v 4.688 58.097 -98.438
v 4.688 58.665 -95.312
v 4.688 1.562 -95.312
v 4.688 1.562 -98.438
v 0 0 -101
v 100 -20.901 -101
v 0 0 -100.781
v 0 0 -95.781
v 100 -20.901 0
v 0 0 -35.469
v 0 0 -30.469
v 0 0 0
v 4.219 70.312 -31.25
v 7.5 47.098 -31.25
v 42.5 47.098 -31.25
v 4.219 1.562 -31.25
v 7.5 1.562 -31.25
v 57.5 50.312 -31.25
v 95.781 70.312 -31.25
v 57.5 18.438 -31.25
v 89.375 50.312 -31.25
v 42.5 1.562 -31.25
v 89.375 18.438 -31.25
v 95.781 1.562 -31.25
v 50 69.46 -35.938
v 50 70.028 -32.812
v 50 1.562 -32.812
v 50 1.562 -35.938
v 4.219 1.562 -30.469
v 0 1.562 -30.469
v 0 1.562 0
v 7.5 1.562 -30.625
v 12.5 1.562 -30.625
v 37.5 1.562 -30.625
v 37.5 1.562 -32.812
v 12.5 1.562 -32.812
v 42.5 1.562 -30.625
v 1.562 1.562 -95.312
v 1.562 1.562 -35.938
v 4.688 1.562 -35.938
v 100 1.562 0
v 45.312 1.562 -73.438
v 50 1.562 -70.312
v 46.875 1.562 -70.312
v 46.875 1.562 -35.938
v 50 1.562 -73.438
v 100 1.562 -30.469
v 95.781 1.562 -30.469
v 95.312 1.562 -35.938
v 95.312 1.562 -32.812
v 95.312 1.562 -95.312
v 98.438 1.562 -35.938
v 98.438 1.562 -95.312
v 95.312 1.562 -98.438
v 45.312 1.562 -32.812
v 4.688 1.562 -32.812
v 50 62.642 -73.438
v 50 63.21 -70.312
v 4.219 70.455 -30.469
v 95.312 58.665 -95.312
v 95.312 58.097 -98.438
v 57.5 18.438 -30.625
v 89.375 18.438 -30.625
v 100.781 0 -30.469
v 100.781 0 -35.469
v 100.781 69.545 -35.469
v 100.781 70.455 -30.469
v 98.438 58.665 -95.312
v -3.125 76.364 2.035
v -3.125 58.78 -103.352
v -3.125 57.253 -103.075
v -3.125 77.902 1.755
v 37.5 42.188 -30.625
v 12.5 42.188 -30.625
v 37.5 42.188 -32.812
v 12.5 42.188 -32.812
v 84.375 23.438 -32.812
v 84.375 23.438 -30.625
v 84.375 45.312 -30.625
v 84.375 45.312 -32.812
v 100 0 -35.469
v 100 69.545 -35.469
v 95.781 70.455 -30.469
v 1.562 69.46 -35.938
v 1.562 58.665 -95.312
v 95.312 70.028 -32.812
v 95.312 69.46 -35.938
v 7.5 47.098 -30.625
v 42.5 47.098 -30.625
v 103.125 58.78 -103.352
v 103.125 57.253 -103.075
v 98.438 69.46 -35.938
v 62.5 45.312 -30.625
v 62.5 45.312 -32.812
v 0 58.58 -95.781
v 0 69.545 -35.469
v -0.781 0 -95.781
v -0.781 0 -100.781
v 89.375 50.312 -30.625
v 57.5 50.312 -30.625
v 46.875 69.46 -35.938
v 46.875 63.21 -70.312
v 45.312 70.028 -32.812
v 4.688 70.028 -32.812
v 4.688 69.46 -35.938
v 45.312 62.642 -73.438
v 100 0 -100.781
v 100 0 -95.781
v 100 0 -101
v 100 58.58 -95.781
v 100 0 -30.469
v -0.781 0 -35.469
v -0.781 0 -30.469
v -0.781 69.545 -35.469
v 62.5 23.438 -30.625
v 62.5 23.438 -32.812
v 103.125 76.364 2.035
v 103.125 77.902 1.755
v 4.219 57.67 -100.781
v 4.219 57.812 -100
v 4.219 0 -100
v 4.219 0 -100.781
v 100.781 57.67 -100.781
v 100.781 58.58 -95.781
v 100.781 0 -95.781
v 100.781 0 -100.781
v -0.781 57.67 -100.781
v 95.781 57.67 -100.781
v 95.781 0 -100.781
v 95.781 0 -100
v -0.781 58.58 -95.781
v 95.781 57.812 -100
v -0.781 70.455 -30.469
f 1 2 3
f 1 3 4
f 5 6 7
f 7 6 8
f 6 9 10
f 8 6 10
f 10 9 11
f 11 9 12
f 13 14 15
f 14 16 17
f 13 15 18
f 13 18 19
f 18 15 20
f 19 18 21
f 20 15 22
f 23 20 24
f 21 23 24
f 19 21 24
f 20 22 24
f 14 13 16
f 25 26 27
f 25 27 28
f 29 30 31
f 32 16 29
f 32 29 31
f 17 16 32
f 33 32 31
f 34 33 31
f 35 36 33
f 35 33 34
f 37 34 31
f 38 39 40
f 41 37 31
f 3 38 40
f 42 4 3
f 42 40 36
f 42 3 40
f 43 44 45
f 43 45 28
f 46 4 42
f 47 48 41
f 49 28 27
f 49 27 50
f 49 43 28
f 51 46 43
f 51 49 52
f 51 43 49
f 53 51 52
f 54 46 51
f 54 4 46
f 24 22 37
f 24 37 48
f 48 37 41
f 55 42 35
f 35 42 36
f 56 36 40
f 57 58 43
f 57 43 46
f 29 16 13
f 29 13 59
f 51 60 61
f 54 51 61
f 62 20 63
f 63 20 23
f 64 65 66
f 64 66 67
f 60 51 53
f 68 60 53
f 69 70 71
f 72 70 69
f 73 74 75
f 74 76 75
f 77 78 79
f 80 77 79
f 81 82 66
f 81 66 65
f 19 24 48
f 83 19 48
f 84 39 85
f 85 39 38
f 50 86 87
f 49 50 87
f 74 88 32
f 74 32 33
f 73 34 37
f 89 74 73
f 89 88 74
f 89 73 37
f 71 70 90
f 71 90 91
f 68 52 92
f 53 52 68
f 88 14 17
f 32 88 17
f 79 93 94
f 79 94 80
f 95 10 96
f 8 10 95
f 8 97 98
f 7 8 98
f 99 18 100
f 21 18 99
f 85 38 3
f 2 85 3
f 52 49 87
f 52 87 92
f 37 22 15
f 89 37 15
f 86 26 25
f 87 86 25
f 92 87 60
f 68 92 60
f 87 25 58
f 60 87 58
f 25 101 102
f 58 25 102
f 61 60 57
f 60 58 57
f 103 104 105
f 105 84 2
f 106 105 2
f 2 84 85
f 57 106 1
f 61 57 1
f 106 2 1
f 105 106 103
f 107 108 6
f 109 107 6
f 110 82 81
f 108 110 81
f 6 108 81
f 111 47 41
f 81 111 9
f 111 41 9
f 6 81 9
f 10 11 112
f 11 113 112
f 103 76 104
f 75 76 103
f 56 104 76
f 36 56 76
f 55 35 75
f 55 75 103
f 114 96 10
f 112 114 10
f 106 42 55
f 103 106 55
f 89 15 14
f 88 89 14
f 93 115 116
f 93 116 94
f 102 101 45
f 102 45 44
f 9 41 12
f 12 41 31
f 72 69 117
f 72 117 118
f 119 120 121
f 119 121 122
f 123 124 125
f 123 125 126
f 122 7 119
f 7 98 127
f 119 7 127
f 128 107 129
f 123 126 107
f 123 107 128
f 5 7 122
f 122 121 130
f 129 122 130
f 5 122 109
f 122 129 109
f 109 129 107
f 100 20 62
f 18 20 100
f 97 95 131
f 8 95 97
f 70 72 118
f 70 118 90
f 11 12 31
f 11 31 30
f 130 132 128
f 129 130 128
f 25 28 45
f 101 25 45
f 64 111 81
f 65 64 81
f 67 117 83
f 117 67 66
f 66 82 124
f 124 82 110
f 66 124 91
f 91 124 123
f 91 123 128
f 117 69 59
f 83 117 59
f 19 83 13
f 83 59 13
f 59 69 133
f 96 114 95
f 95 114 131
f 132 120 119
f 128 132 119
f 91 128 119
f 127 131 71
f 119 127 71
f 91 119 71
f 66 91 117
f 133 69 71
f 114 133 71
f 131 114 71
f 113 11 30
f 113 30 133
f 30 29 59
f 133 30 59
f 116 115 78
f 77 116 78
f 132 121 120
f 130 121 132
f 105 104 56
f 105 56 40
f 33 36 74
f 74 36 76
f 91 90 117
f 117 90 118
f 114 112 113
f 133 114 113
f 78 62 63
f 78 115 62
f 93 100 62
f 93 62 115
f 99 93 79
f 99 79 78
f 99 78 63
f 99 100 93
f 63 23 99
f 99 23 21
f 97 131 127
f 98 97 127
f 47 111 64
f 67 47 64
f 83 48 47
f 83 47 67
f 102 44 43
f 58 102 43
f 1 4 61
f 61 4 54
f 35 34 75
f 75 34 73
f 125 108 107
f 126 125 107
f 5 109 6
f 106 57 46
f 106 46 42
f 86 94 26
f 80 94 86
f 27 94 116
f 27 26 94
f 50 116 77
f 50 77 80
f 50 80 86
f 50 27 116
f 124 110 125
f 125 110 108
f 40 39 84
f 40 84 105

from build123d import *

# Parameters (mm, degrees)
SKETCH1_W                = 1600
SKETCH1_H                = 1600
BOSS_EXTRUDE1_DEPTH      = 25
SKETCH2_W                = 1600
SKETCH2_H                = 1100
SKETCH2_W_2              = 1550
SKETCH2_H_2              = 1050
BOSS_EXTRUDE2_DEPTH      = 1100
BOSS_EXTRUDE3_DEPTH      = 50
BOSS_EXTRUDE3_DEPTH_BACK = 1650
CUT_EXTRUDE1_DEPTH       = 2648.749751348
BOSS_EXTRUDE4_DEPTH      = 12.5
BOSS_EXTRUDE5_DEPTH      = 67.5
SKETCH8_W                = 400
SKETCH8_H                = 650
SKETCH8_W_2              = 350
SKETCH8_H_2              = 350
CUT_EXTRUDE2_DEPTH       = 68.5
SKETCH9_W                = 510
SKETCH9_H                = 510
SKETCH9_W_2              = 350
SKETCH9_H_2              = 350
BOSS_EXTRUDE6_DEPTH      = 10
BOSS_EXTRUDE7_REACH      = 2638.073
SKETCH10_W               = 50
SKETCH10_H               = 50
SCALE1_SCALE             = 0.125
SCALE2_SCALE             = 0.5
BOSS_EXTRUDE9_DEPTH      = 101


with BuildPart() as part:
    # Sketch1 → Boss-Extrude1 (new body)
    with BuildSketch(Plane(origin=(0, 0, 0), x_dir=(1, 0, 0), z_dir=(0, 1, 0))):
        with Locations((800, 800)):
            Rectangle(SKETCH1_W, SKETCH1_H)
    extrude(amount=BOSS_EXTRUDE1_DEPTH)

    # Sketch2 → Boss-Extrude2 (add)
    with BuildSketch(Plane(origin=(0, 25, 0), x_dir=(1, 0, 0), z_dir=(0, 1, 0))):
        with Locations((800, 1050)):
            Rectangle(SKETCH2_W, SKETCH2_H)
        with Locations((800, 1050)):
            Rectangle(SKETCH2_W_2, SKETCH2_H_2, mode=Mode.SUBTRACT)
    extrude(amount=BOSS_EXTRUDE2_DEPTH)

    # Sketch3 → Boss-Extrude3 (add, two sides: drawn at the far end of the back side and taken through both)
    with BuildSketch(Plane(origin=(1600, 0, 0), x_dir=(0, 0, -1), z_dir=(1, 0, 0)).offset(-BOSS_EXTRUDE3_DEPTH_BACK)):
        Polygon((1600, 925), (500, 1125), (-32.556177987, 1221.828395998), (-28.084042032, 1246.42514375), (1653.633304815, 940.474679295), (1649.193495505, 916.05572809), align=None)
    extrude(amount=BOSS_EXTRUDE3_DEPTH + BOSS_EXTRUDE3_DEPTH_BACK)

    # Sketch4 → Cut-Extrude1 (cut, through all)
    with BuildSketch(Plane(origin=(1600, 0, 0), x_dir=(0, 0, -1), z_dir=(1, 0, 0))):
        Polygon((-28.084042032, 1246.42514375), (1653.633304815, 940.474679295), (1653.633304815, 1246.42514375), align=None)
    extrude(amount=-CUT_EXTRUDE1_DEPTH, mode=Mode.SUBTRACT)

    # Sketch5 → Boss-Extrude4 (add)
    with BuildSketch(Plane(origin=(1600, 0, 0), x_dir=(0, 0, -1), z_dir=(1, 0, 0))):
        Polygon((1532.5, 937.272727273), (1532.5, 0), (1612.5, 0), (1612.5, 922.727272727), align=None)
        Polygon((567.5, 1112.727272727), (567.5, 0), (487.5, 0), (487.5, 1127.272727273), align=None)
    boss_extrude4 = extrude(amount=BOSS_EXTRUDE4_DEPTH)

    # Sketch6 → Boss-Extrude5 (add)
    with BuildSketch(Plane.ZY.offset(-1600)):
        Polygon((-1600, 925), (-1600, 0), (-1612.5, 0), (-1612.5, 922.727272727), align=None)
        Polygon((-487.5, 1127.272727273), (-500, 1125), (-500, 25), (-487.5, 25), align=None)
    boss_extrude5 = extrude(amount=BOSS_EXTRUDE5_DEPTH)

    # Mirror1: Boss-Extrude4, Boss-Extrude5 across plane
    add(boss_extrude4.mirror(Plane(origin=(800, 0, 0), x_dir=(0, 0, 1), z_dir=(1, 0, 0))))
    add(boss_extrude5.mirror(Plane(origin=(800, 0, 0), x_dir=(0, 0, 1), z_dir=(1, 0, 0))))

    # Sketch8 → Cut-Extrude2 (cut)
    with BuildSketch(Plane.XY.offset(-500)):
        with Locations((400, 350)):
            Rectangle(SKETCH8_W, SKETCH8_H)
        with Locations((1175, 550)):
            Rectangle(SKETCH8_W_2, SKETCH8_H_2)
    extrude(amount=-CUT_EXTRUDE2_DEPTH, mode=Mode.SUBTRACT)

    # Sketch9 → Boss-Extrude6 (add)
    # profile 1 of 2: a face of its own
    with BuildSketch(Plane.XY.offset(-500)):
        Polygon((200, 25), (200, 673.570628699), (200, 675), (600, 675), (600, 673.570628699), (600, 25), (680, 25), (680, 753.570628699), (120, 753.570628699), (120, 25), align=None)
    # profile 2 of 2: a face of its own
    with BuildSketch(Plane.XY.offset(-500)):
        with Locations((1175, 550)):
            Rectangle(SKETCH9_W, SKETCH9_H)
        with Locations((1175, 550)):
            Rectangle(SKETCH9_W_2, SKETCH9_H_2, mode=Mode.SUBTRACT)
    extrude(amount=BOSS_EXTRUDE6_DEPTH)

    # Boss-Extrude7: up to this plane
    boss_extrude7_end = Plane(origin=(1650, 925, -1600), z_dir=(0, 0.9838699100999074, -0.1788854381999831))
    # Sketch10 → Boss-Extrude7 (add, up to the surface)
    with BuildSketch(Plane(origin=(0, 25, 0), x_dir=(1, 0, 0), z_dir=(0, 1, 0)), mode=Mode.PRIVATE) as boss_extrude7_sk1:
        with Locations((50, 1550)):
            Rectangle(SKETCH10_W, SKETCH10_H)
    boss_extrude7_tool1 = split(extrude(boss_extrude7_sk1.sketch, amount=BOSS_EXTRUDE7_REACH, mode=Mode.PRIVATE), bisect_by=boss_extrude7_end, keep=Keep.BOTH, mode=Mode.PRIVATE)
    add(boss_extrude7_tool1.solids().sort_by_distance((50, 25, -1550))[0])
    # Sketch10 → Boss-Extrude7 (add, up to the surface)
    with BuildSketch(Plane(origin=(0, 25, 0), x_dir=(1, 0, 0), z_dir=(0, 1, 0)), mode=Mode.PRIVATE) as boss_extrude7_sk2:
        with Locations((1550, 1550)):
            Rectangle(SKETCH10_W, SKETCH10_H)
    boss_extrude7_tool2 = split(extrude(boss_extrude7_sk2.sketch, amount=BOSS_EXTRUDE7_REACH, mode=Mode.PRIVATE), bisect_by=boss_extrude7_end, keep=Keep.BOTH, mode=Mode.PRIVATE)
    add(boss_extrude7_tool2.solids().sort_by_distance((1550, 25, -1550))[0])
    # Sketch10 → Boss-Extrude7 (add, up to the surface)
    with BuildSketch(Plane(origin=(0, 25, 0), x_dir=(1, 0, 0), z_dir=(0, 1, 0)), mode=Mode.PRIVATE) as boss_extrude7_sk3:
        with Locations((50, 550)):
            Rectangle(SKETCH10_W, SKETCH10_H)
    boss_extrude7_tool3 = split(extrude(boss_extrude7_sk3.sketch, amount=BOSS_EXTRUDE7_REACH, mode=Mode.PRIVATE), bisect_by=boss_extrude7_end, keep=Keep.BOTH, mode=Mode.PRIVATE)
    add(boss_extrude7_tool3.solids().sort_by_distance((50, 25, -550))[0])
    # Sketch10 → Boss-Extrude7 (add, up to the surface)
    with BuildSketch(Plane(origin=(0, 25, 0), x_dir=(1, 0, 0), z_dir=(0, 1, 0)), mode=Mode.PRIVATE) as boss_extrude7_sk4:
        with Locations((1550, 550)):
            Rectangle(SKETCH10_W, SKETCH10_H)
    boss_extrude7_tool4 = split(extrude(boss_extrude7_sk4.sketch, amount=BOSS_EXTRUDE7_REACH, mode=Mode.PRIVATE), bisect_by=boss_extrude7_end, keep=Keep.BOTH, mode=Mode.PRIVATE)
    add(boss_extrude7_tool4.solids().sort_by_distance((1550, 25, -550))[0])
    # Sketch10 → Boss-Extrude7 (add, up to the surface)
    with BuildSketch(Plane(origin=(0, 25, 0), x_dir=(1, 0, 0), z_dir=(0, 1, 0)), mode=Mode.PRIVATE) as boss_extrude7_sk5:
        Polygon((725, 525), (750, 525), (800, 525), (800, 575), (750, 575), (750, 1125), (800, 1125), (800, 1175), (750, 1175), (725, 1175), align=None)
    boss_extrude7_tool5 = split(extrude(boss_extrude7_sk5.sketch, amount=BOSS_EXTRUDE7_REACH, mode=Mode.PRIVATE), bisect_by=boss_extrude7_end, keep=Keep.BOTH, mode=Mode.PRIVATE)
    add(boss_extrude7_tool5.solids().sort_by_distance((746.323529, 25, -850))[0])


with BuildPart() as part_1:
    # Scale1: scaled about (0, 0, 0)
    add(part.part.scale(SCALE1_SCALE))


with BuildPart() as part_2:
    # Scale2: scaled about (0, 0, 0)
    add(part_1.part.scale(SCALE2_SCALE))

    # Sketch11 → Boss-Extrude9 (add)
    with BuildSketch(Plane.XY):
        Polygon((0, 0), (100, 0), (100, -20.901409281), align=None)
    extrude(amount=-BOSS_EXTRUDE9_DEPTH)


solid = part_2.part
